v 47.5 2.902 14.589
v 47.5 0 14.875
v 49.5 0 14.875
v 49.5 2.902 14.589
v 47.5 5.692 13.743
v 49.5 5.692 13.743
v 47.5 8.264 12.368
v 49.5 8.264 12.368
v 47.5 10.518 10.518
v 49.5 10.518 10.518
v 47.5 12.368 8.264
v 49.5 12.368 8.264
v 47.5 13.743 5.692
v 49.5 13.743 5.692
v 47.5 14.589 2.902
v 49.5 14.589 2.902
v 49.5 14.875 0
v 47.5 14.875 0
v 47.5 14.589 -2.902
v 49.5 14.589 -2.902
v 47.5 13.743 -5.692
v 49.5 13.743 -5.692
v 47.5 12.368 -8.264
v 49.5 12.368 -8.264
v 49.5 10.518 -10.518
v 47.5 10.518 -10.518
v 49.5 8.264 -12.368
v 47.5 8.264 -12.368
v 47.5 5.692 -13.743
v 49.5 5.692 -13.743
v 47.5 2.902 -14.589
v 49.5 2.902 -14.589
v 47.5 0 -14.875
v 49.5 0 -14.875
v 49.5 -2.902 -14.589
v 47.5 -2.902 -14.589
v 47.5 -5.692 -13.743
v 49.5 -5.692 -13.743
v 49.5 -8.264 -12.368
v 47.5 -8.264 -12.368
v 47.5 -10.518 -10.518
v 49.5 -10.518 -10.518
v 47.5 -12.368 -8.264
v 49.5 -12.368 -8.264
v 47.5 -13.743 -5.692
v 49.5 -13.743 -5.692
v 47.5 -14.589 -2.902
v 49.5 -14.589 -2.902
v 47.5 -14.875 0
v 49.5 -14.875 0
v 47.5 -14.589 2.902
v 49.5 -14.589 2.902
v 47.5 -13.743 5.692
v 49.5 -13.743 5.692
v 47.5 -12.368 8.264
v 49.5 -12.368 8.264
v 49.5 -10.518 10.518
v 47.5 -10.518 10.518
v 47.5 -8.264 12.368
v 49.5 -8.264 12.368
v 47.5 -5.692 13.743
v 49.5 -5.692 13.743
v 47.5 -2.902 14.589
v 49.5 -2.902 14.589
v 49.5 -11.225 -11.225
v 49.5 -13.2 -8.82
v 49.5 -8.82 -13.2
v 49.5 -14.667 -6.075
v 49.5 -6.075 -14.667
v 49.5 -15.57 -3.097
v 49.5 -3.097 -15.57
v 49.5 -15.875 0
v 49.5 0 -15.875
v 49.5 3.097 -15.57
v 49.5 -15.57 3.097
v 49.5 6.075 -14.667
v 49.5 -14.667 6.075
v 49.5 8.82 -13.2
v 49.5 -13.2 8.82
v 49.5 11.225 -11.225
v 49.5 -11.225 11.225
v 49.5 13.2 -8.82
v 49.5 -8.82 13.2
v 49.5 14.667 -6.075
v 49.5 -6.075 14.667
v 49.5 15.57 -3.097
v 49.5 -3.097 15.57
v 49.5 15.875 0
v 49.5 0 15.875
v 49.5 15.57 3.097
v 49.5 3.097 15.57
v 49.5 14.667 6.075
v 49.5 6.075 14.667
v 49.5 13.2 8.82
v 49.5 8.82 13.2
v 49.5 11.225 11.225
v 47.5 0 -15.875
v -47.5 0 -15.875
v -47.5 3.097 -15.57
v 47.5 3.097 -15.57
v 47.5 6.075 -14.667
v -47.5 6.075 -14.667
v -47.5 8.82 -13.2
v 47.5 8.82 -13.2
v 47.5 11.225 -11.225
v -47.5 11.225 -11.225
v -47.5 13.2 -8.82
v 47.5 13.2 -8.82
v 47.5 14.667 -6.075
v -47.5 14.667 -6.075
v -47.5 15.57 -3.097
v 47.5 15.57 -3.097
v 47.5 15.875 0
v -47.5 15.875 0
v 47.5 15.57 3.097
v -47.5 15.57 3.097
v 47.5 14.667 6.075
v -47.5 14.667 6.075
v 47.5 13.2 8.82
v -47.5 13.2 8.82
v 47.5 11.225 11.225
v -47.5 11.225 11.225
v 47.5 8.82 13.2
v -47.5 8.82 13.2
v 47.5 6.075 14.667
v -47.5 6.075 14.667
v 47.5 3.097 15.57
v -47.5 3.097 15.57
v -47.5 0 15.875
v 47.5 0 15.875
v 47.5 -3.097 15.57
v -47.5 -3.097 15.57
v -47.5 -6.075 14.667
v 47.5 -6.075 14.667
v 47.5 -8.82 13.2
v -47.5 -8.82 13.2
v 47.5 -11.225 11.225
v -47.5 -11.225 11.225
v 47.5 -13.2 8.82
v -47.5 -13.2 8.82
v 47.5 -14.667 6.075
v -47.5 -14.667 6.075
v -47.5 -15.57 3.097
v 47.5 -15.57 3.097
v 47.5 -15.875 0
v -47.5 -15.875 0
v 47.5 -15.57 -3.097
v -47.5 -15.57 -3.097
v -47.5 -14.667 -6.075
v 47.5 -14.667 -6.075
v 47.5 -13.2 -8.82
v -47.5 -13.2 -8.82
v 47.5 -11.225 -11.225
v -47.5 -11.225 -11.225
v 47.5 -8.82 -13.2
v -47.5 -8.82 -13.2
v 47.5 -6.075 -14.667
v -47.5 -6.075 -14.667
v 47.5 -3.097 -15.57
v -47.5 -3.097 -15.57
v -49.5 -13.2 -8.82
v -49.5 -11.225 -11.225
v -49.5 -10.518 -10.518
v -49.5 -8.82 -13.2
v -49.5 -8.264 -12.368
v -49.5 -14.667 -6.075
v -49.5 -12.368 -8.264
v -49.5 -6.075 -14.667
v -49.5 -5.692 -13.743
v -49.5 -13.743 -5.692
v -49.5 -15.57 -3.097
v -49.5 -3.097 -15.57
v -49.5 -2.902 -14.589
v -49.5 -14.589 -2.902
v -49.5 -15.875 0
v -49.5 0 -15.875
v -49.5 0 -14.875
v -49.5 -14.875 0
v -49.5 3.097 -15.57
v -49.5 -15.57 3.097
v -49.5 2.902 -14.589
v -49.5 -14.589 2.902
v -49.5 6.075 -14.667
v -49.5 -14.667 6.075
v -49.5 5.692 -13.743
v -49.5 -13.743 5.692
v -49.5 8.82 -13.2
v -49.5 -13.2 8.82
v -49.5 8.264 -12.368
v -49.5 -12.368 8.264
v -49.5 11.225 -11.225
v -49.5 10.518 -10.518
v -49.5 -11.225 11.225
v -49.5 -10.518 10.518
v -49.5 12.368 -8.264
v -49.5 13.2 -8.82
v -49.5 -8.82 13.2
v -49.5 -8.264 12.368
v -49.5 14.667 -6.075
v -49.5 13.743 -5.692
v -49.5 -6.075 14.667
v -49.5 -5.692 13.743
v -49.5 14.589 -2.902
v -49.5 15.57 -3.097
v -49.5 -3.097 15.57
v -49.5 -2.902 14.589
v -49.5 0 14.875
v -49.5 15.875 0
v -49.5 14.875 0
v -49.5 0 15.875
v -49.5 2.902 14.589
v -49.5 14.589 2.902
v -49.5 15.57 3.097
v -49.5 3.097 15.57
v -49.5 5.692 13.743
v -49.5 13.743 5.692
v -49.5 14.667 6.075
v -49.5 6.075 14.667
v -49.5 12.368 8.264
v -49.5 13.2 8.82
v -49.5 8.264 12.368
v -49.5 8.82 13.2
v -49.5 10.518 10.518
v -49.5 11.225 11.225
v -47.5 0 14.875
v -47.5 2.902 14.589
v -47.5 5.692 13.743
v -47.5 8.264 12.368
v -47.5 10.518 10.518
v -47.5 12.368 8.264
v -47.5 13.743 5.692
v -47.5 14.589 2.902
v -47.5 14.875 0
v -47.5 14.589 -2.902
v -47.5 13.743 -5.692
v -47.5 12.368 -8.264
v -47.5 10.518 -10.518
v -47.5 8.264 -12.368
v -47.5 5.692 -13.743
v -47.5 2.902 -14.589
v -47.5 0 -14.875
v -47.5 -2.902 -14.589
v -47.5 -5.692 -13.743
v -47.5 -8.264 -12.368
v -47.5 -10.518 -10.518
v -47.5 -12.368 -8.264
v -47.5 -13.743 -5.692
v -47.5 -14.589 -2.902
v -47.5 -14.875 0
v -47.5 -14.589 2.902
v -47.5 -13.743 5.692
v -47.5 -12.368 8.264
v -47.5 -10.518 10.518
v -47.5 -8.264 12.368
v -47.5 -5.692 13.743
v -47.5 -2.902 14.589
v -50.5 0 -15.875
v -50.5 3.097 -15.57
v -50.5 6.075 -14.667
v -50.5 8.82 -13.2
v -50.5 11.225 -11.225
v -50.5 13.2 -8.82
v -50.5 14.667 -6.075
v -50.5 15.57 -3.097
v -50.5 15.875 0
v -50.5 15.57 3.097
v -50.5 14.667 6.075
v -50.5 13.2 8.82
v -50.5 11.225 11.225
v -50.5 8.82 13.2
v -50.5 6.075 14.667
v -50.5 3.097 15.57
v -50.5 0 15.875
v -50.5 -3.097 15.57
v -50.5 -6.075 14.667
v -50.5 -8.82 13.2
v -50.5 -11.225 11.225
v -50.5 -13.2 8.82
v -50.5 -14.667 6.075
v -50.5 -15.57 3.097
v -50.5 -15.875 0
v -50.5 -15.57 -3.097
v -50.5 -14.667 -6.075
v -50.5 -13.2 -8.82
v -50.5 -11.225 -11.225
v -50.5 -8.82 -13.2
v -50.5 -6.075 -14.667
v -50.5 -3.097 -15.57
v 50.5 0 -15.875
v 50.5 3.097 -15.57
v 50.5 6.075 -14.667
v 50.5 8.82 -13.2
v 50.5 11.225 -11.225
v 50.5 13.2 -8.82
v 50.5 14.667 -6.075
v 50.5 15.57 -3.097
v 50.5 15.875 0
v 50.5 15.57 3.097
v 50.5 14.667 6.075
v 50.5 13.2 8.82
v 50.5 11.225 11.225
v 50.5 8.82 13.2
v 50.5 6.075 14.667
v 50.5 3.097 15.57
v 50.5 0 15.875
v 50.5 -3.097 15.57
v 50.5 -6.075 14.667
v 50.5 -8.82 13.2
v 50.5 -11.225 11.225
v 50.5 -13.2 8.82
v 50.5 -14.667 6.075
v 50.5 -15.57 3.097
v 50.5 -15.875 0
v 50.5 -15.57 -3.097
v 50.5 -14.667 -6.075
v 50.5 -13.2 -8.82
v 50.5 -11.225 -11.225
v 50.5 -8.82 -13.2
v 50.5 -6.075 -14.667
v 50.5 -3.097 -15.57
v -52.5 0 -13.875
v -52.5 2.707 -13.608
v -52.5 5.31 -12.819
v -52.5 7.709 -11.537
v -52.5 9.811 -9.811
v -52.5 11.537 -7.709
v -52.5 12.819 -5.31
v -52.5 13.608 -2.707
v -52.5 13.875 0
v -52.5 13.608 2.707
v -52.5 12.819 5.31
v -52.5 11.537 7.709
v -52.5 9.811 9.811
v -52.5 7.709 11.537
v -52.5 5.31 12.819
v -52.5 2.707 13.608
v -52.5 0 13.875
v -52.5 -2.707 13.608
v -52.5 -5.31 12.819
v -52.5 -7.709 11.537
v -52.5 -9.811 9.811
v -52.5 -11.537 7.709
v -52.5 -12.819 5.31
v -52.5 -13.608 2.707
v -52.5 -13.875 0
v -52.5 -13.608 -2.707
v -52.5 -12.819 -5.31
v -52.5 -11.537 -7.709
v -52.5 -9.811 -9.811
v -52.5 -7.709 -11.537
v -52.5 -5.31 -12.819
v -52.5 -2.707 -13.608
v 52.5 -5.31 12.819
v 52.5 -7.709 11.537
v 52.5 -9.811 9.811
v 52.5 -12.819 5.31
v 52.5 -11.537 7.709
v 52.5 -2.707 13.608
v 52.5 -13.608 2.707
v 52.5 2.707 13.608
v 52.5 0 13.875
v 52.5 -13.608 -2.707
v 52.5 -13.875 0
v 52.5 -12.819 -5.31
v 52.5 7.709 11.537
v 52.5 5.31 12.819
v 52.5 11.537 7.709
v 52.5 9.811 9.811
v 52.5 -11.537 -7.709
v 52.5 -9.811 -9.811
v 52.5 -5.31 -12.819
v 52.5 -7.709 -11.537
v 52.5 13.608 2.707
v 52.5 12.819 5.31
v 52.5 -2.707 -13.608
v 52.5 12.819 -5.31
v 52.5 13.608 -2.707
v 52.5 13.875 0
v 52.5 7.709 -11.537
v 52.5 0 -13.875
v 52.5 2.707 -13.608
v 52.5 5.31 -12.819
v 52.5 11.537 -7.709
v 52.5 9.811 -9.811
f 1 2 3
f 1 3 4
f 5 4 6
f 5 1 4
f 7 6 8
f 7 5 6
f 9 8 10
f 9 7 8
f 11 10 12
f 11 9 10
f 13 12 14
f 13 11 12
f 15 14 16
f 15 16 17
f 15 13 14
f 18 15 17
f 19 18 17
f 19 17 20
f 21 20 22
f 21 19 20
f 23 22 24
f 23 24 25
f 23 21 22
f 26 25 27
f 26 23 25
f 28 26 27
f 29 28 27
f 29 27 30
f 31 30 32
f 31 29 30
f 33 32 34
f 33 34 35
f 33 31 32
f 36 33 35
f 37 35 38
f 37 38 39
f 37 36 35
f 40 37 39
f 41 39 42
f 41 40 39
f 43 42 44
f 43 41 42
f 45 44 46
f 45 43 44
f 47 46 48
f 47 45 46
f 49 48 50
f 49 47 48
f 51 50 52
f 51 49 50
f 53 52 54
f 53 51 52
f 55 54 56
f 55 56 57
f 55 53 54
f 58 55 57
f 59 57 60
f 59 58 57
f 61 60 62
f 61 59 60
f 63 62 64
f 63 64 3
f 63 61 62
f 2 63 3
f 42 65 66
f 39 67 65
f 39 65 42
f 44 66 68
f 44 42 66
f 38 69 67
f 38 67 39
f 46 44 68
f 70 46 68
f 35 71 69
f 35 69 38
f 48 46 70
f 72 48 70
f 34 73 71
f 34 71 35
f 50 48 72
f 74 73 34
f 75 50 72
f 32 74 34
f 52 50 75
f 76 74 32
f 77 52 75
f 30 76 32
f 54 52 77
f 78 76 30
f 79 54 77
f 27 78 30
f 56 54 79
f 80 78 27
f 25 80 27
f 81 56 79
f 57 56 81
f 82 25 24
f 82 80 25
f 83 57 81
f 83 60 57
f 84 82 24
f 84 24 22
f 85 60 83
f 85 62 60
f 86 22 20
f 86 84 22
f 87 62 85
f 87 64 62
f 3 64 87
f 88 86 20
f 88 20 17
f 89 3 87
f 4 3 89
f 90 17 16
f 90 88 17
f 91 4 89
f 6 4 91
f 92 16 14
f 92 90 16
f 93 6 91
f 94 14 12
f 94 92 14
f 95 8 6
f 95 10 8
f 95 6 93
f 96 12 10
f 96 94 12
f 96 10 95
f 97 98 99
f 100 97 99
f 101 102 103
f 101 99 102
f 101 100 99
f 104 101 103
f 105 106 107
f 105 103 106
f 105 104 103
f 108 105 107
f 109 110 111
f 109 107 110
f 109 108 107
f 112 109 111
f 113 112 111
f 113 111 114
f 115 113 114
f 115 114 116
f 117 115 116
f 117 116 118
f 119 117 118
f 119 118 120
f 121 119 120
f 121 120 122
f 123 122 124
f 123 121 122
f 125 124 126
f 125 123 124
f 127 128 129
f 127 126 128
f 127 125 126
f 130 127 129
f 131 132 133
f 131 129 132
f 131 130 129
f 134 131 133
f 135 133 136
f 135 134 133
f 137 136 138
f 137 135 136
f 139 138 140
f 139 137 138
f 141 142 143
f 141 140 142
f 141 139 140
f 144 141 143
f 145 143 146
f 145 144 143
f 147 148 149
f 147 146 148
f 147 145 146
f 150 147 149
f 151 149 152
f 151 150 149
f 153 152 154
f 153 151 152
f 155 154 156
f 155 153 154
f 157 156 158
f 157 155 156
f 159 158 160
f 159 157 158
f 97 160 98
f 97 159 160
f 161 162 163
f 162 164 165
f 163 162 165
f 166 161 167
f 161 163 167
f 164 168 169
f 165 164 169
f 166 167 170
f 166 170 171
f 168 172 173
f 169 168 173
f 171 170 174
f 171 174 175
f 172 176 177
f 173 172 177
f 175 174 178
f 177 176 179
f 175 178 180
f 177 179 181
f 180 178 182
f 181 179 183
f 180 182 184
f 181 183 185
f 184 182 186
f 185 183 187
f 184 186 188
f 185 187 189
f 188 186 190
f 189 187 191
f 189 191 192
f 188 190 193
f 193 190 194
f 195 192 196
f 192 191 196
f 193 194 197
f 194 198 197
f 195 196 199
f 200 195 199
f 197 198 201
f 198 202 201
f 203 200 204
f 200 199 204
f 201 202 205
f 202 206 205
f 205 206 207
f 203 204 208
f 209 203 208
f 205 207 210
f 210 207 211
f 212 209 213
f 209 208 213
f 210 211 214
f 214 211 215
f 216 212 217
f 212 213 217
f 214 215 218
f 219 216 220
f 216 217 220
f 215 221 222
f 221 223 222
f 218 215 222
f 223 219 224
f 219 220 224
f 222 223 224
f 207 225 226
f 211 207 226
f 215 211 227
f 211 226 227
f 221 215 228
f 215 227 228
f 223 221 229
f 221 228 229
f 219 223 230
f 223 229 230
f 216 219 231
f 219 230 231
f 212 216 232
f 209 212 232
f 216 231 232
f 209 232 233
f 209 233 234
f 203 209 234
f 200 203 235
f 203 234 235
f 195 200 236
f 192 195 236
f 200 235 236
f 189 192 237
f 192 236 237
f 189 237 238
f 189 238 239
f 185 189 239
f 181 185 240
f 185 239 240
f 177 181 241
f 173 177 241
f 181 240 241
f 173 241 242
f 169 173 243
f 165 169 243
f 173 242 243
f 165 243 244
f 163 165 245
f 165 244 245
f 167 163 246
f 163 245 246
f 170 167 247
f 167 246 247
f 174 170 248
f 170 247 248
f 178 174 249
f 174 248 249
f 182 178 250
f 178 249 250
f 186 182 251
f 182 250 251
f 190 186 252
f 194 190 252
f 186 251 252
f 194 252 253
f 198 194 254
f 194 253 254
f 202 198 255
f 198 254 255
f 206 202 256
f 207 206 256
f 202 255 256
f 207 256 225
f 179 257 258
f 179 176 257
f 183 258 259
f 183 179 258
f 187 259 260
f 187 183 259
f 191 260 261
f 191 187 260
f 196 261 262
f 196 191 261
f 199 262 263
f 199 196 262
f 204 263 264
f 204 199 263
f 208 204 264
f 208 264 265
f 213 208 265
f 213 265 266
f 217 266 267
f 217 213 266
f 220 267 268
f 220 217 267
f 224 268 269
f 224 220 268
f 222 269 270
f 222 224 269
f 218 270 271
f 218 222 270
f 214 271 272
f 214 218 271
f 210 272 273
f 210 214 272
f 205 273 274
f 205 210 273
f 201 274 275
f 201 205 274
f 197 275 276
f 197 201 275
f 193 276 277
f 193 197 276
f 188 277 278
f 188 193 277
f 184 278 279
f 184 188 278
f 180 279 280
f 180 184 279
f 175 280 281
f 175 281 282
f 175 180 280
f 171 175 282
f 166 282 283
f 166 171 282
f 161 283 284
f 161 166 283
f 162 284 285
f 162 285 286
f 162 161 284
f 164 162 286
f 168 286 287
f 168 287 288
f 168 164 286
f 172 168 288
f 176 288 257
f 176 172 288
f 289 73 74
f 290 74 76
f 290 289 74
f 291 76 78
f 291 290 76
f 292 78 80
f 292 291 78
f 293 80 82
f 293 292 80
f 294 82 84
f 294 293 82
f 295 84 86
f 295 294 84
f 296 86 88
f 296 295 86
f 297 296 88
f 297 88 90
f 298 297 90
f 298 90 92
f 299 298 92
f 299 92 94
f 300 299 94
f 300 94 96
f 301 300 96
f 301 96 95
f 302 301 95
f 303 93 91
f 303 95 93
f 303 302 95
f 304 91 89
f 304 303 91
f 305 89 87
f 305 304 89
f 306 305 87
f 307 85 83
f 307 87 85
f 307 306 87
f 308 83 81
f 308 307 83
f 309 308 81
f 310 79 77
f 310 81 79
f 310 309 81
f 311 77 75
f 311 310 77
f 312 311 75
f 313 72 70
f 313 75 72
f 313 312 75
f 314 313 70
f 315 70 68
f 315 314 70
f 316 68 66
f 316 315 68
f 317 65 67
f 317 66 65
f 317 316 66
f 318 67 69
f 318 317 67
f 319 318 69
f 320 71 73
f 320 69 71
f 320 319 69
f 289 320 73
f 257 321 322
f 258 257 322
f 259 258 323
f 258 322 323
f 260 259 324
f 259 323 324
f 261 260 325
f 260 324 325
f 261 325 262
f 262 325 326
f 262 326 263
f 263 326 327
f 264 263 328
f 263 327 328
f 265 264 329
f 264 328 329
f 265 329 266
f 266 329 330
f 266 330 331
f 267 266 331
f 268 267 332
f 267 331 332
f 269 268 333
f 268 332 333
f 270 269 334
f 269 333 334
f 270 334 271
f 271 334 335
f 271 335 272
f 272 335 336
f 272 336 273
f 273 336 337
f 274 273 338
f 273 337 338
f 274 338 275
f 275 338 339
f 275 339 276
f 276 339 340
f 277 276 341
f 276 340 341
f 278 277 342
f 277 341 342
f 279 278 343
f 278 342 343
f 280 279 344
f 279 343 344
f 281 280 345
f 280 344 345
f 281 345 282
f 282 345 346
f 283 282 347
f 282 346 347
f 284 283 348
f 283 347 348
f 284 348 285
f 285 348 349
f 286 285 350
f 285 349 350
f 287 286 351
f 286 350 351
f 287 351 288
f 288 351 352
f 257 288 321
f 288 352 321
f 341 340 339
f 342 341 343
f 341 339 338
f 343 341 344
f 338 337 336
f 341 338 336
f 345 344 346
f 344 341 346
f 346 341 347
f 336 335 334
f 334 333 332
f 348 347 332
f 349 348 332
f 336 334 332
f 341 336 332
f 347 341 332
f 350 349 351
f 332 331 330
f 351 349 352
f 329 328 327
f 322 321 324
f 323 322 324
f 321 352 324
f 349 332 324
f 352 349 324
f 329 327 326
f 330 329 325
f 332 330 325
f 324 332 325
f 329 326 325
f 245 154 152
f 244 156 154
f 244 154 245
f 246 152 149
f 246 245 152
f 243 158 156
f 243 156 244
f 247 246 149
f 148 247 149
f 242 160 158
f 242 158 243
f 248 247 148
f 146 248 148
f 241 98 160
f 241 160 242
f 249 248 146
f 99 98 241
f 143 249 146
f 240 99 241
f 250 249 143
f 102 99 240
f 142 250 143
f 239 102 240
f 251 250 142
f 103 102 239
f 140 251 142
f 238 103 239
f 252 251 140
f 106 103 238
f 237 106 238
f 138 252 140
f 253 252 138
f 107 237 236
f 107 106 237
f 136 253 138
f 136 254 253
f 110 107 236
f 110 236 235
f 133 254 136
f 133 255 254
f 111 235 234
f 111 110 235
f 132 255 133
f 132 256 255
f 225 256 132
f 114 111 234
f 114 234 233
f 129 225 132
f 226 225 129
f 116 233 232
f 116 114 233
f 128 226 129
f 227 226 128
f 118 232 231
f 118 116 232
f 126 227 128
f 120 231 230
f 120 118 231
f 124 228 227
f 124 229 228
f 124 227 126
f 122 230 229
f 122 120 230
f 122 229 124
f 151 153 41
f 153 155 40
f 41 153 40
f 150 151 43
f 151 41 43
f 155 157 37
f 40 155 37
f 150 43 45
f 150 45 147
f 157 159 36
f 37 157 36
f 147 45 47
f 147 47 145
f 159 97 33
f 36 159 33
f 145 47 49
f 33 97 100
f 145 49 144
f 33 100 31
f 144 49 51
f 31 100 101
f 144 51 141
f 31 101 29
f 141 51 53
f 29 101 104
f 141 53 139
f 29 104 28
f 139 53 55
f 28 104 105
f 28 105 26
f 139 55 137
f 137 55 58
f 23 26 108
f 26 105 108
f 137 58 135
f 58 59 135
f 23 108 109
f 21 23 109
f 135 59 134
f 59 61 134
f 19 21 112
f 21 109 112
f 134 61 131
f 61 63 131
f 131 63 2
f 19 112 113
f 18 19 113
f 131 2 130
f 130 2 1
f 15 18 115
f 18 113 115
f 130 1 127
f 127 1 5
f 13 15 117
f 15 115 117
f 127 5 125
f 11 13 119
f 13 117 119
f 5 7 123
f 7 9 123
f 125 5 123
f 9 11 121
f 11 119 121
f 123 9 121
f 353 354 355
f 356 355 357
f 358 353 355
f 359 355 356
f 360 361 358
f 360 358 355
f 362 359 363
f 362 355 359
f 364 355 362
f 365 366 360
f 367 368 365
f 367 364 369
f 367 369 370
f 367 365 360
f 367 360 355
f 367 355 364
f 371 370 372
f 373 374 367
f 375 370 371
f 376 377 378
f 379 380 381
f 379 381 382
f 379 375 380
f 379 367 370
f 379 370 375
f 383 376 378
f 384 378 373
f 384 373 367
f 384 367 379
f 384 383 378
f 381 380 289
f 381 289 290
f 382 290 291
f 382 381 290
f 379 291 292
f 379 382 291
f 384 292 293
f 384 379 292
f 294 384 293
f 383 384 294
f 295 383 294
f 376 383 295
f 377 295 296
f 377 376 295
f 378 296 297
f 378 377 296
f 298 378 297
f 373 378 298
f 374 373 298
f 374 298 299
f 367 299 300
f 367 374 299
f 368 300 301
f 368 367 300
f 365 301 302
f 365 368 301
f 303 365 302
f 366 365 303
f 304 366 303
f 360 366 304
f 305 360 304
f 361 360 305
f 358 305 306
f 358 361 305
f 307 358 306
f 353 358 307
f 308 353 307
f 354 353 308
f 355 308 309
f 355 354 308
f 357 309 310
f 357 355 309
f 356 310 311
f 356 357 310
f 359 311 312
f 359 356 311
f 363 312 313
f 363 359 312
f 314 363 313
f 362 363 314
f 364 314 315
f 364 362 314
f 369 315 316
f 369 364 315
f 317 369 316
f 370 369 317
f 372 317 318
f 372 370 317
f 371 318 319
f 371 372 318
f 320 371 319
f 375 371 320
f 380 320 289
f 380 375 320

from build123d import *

# Parameters (mm, degrees)
SKETCH1_R           = 15.875
BOSS_EXTRUDE1_DEPTH = 52.5
CHAMFER1_SIZE       = 2
SKETCH2_R           = 15.875
SKETCH2_R_2         = 14.875
CUT_EXTRUDE1_DEPTH  = 2


with BuildPart() as part:
    # Sketch1 → Boss-Extrude1 (new body, symmetric)
    with BuildSketch(Plane(origin=(0, 0, 0), x_dir=(0, 0, -1), z_dir=(1, 0, 0))):
        Circle(SKETCH1_R)
    extrude(amount=BOSS_EXTRUDE1_DEPTH, both=True)

    # Chamfer1
    chamfer1_edges = [part.edges().sort_by_distance(p)[0] for p in [
        (-52.5, 0, 15.875),
        (52.5, 0, 15.875),
    ]]
    chamfer(chamfer1_edges, length=CHAMFER1_SIZE)

    # Sketch2 → Cut-Extrude1 (cut)
    with BuildSketch(Plane.ZY.offset(47.5)):
        Circle(SKETCH2_R)
        Circle(SKETCH2_R_2, mode=Mode.SUBTRACT)
    cut_extrude1 = extrude(amount=CUT_EXTRUDE1_DEPTH, mode=Mode.SUBTRACT)

    # Mirror1: Cut-Extrude1 across plane
    add(cut_extrude1.mirror(Plane(origin=(0, 0, 0), x_dir=(0, 0, 1), z_dir=(1, 0, 0))), mode=Mode.SUBTRACT)


solid = part.part
